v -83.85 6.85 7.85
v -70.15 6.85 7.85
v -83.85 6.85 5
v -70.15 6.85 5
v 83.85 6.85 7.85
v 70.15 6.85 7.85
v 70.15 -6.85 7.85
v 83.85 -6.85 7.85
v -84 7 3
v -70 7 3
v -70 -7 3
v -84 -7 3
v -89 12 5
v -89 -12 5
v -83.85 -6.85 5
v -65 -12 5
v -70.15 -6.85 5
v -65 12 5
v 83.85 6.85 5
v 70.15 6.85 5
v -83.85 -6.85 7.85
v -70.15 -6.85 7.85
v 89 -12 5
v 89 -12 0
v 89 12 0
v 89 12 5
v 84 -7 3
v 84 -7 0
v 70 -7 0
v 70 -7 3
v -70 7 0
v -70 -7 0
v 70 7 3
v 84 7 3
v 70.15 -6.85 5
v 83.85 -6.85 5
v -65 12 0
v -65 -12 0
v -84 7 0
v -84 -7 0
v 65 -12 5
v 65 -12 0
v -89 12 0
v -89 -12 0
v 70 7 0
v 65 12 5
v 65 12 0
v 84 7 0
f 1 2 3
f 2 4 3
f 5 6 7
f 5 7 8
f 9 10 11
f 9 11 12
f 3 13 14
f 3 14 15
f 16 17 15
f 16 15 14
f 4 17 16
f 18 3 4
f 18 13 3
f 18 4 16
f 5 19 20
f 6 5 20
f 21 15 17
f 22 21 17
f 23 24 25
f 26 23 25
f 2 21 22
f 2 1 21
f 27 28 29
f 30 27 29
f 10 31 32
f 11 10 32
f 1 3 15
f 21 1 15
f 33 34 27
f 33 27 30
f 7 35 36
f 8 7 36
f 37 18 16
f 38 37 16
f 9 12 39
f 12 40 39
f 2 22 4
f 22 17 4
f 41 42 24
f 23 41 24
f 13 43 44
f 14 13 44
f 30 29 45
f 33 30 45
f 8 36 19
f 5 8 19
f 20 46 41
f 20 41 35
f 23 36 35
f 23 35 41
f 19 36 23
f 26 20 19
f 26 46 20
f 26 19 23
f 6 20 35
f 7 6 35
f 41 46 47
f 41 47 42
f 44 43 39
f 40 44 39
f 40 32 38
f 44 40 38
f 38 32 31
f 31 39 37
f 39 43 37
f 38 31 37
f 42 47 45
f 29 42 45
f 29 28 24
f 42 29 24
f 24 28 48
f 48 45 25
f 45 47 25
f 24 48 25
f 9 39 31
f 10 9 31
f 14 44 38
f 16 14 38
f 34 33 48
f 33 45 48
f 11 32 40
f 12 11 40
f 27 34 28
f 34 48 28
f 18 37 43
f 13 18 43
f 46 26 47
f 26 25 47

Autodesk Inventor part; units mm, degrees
ref_plane "YZ Plane" through (0, 0, 0) normal (1, 0, 0) x (0, 1, 0)
ref_plane "XZ Plane" through (0, 0, 0) normal (0, 1, 0) x (-1, 0, 0)
ref_plane "XY Plane" through (0, 0, 0) normal (0, 0, 1) x (1, 0, 0)
sketch "Skizze1" plane through (0, 0, 0) normal (0, 0, 1) x (1, 0, 0)
  line L0 (-89, -12) -> (89, -12)
  line L1 (89, -12) -> (89, 12)
  line L2 (89, 12) -> (-89, 12)
  line L3 (-89, 12) -> (-89, -12)
  line L4 (-89, -12) -> (89, 12) construction
  line L5 (89, -12) -> (-89, 12) construction
  line L6 (65, 12) -> (65, -12)
  line L7 (-65, 12) -> (-65, -12)
  line L8 (-89, 12) -> (-65, -12) construction
  line L9 (-65, 12) -> (-89, -12) construction
  line L10 (89, 12) -> (65, -12) construction
  line L11 (65, 12) -> (89, -12) construction
  point P0 (0, 0)
  dimension "d0" = 178
  dimension "d1" = 24
  dimension "d2" = 24
  dimension "d3" = 24
extrude "Extrusion1" add sketch "Skizze1" along normal blind 5
sketch "Skizze3" plane through (0, 0, 5) normal (0, 0, 1) x (1, 0, 0)
  line L0 (-89, -12) -> (89, -12)
  line L1 (89, -12) -> (89, 12)
  line L2 (89, 12) -> (-89, 12)
  line L3 (-89, 12) -> (-89, -12)
  line L4 (-89, -12) -> (89, 12) construction
  line L5 (89, -12) -> (-89, 12) construction
  line L6 (65, 12) -> (65, -12)
  line L7 (-65, 12) -> (-65, -12)
  line L8 (-89, 12) -> (-65, -12) construction
  line L9 (-65, 12) -> (-89, -12) construction
  line L10 (89, 12) -> (65, -12) construction
  line L11 (65, 12) -> (89, -12) construction
  line L12 (70.15, -6.85) -> (83.85, -6.85)
  line L13 (83.85, -6.85) -> (83.85, 6.85)
  line L14 (83.85, 6.85) -> (70.15, 6.85)
  line L15 (70.15, 6.85) -> (70.15, -6.85)
  line L16 (70.15, -6.85) -> (83.85, 6.85) construction
  line L17 (83.85, -6.85) -> (70.15, 6.85) construction
  line L18 (-83.85, -6.85) -> (-70.15, -6.85)
  line L19 (-70.15, -6.85) -> (-70.15, 6.85)
  line L20 (-70.15, 6.85) -> (-83.85, 6.85)
  line L21 (-83.85, 6.85) -> (-83.85, -6.85)
  line L22 (-83.85, -6.85) -> (-70.15, 6.85) construction
  line L23 (-70.15, -6.85) -> (-83.85, 6.85) construction
  point P0 (0, 0)
  point P1 (0, 0)
  point P2 (77, 0)
  point P3 (-77, 0)
  dimension "d10" = 178
  dimension "d11" = 24
  dimension "d12" = 24
  dimension "d13" = 24
  dimension "d14" = 13.7
  dimension "d15" = 13.7
extrude "Extrusion2" add sketch "Skizze3" along normal blind 2.85 contours L15 L14 L13 L12 | L21 L20 L19 L18
sketch "Skizze4" plane through (0, 0, 0) normal (0, 0, -1) x (-1, 0, 0)
  line L0 (-89, -12) -> (89, -12)
  line L1 (89, -12) -> (89, 12)
  line L2 (89, 12) -> (-89, 12)
  line L3 (-89, 12) -> (-89, -12)
  line L4 (-89, -12) -> (89, 12) construction
  line L5 (89, -12) -> (-89, 12) construction
  line L6 (65, 12) -> (65, -12)
  line L7 (-65, 12) -> (-65, -12)
  line L8 (-89, 12) -> (-65, -12) construction
  line L9 (-65, 12) -> (-89, -12) construction
  line L10 (89, 12) -> (65, -12) construction
  line L11 (65, 12) -> (89, -12) construction
  line L12 (70, -7) -> (84, -7)
  line L13 (84, -7) -> (84, 7)
  line L14 (84, 7) -> (70, 7)
  line L15 (70, 7) -> (70, -7)
  line L16 (70, -7) -> (84, 7) construction
  line L17 (84, -7) -> (70, 7) construction
  line L18 (-84, -7) -> (-70, -7)
  line L19 (-70, -7) -> (-70, 7)
  line L20 (-70, 7) -> (-84, 7)
  line L21 (-84, 7) -> (-84, -7)
  line L22 (-84, -7) -> (-70, 7) construction
  line L23 (-70, -7) -> (-84, 7) construction
  point P0 (0, 0)
  point P1 (0, 0)
  point P2 (0, 0)
  point P3 (77, 0)
  point P4 (-77, 0)
  dimension "d18" = 178
  dimension "d19" = 24
  dimension "d20" = 24
  dimension "d21" = 24
  dimension "d22" = 14
  dimension "d23" = 14
extrude "Extrusion3" cut sketch "Skizze4" against normal blind 3 contours L15 L14 L13 L12 | L21 L20 L19 L18
sketch "Skizze5" plane through (0, 0, 5) normal (0, 0, 1) x (1, 0, 0)
  line L0 (-89, 12) -> (-89, -12) projected
  line L1 (-89, -12) -> (89, -12) projected
  line L2 (-89, 12) -> (-65, 12)
  line L3 (-65, 12) -> (-65, -12)
  line L4 (-65, -12) -> (-89, -12)
  line L5 (-89, -12) -> (-89, 12)
  line L6 (89, -12) -> (89, 12) projected
  line L7 (89, 12) -> (65, 12)
  line L8 (65, 12) -> (65, -12)
  line L9 (65, -12) -> (89, -12)
  line L10 (89, -12) -> (89, 12)
  line L11 (-65, 12) -> (65, 12)
  line L12 (65, 12) -> (65, -12)
  line L13 (65, -12) -> (-65, -12)
  line L14 (-65, -12) -> (-65, 12)
  point P0 (0, 0)
  point P1 (65, -12)
  dimension "d26" = 24
  dimension "d27" = 24
extrude "Extrusion4" cut sketch "Skizze5" against normal through all contours L11 L8 L1 L3
properties part number "20210330_5mmFuss_Korpus" material "Acetal Resin, Black"
